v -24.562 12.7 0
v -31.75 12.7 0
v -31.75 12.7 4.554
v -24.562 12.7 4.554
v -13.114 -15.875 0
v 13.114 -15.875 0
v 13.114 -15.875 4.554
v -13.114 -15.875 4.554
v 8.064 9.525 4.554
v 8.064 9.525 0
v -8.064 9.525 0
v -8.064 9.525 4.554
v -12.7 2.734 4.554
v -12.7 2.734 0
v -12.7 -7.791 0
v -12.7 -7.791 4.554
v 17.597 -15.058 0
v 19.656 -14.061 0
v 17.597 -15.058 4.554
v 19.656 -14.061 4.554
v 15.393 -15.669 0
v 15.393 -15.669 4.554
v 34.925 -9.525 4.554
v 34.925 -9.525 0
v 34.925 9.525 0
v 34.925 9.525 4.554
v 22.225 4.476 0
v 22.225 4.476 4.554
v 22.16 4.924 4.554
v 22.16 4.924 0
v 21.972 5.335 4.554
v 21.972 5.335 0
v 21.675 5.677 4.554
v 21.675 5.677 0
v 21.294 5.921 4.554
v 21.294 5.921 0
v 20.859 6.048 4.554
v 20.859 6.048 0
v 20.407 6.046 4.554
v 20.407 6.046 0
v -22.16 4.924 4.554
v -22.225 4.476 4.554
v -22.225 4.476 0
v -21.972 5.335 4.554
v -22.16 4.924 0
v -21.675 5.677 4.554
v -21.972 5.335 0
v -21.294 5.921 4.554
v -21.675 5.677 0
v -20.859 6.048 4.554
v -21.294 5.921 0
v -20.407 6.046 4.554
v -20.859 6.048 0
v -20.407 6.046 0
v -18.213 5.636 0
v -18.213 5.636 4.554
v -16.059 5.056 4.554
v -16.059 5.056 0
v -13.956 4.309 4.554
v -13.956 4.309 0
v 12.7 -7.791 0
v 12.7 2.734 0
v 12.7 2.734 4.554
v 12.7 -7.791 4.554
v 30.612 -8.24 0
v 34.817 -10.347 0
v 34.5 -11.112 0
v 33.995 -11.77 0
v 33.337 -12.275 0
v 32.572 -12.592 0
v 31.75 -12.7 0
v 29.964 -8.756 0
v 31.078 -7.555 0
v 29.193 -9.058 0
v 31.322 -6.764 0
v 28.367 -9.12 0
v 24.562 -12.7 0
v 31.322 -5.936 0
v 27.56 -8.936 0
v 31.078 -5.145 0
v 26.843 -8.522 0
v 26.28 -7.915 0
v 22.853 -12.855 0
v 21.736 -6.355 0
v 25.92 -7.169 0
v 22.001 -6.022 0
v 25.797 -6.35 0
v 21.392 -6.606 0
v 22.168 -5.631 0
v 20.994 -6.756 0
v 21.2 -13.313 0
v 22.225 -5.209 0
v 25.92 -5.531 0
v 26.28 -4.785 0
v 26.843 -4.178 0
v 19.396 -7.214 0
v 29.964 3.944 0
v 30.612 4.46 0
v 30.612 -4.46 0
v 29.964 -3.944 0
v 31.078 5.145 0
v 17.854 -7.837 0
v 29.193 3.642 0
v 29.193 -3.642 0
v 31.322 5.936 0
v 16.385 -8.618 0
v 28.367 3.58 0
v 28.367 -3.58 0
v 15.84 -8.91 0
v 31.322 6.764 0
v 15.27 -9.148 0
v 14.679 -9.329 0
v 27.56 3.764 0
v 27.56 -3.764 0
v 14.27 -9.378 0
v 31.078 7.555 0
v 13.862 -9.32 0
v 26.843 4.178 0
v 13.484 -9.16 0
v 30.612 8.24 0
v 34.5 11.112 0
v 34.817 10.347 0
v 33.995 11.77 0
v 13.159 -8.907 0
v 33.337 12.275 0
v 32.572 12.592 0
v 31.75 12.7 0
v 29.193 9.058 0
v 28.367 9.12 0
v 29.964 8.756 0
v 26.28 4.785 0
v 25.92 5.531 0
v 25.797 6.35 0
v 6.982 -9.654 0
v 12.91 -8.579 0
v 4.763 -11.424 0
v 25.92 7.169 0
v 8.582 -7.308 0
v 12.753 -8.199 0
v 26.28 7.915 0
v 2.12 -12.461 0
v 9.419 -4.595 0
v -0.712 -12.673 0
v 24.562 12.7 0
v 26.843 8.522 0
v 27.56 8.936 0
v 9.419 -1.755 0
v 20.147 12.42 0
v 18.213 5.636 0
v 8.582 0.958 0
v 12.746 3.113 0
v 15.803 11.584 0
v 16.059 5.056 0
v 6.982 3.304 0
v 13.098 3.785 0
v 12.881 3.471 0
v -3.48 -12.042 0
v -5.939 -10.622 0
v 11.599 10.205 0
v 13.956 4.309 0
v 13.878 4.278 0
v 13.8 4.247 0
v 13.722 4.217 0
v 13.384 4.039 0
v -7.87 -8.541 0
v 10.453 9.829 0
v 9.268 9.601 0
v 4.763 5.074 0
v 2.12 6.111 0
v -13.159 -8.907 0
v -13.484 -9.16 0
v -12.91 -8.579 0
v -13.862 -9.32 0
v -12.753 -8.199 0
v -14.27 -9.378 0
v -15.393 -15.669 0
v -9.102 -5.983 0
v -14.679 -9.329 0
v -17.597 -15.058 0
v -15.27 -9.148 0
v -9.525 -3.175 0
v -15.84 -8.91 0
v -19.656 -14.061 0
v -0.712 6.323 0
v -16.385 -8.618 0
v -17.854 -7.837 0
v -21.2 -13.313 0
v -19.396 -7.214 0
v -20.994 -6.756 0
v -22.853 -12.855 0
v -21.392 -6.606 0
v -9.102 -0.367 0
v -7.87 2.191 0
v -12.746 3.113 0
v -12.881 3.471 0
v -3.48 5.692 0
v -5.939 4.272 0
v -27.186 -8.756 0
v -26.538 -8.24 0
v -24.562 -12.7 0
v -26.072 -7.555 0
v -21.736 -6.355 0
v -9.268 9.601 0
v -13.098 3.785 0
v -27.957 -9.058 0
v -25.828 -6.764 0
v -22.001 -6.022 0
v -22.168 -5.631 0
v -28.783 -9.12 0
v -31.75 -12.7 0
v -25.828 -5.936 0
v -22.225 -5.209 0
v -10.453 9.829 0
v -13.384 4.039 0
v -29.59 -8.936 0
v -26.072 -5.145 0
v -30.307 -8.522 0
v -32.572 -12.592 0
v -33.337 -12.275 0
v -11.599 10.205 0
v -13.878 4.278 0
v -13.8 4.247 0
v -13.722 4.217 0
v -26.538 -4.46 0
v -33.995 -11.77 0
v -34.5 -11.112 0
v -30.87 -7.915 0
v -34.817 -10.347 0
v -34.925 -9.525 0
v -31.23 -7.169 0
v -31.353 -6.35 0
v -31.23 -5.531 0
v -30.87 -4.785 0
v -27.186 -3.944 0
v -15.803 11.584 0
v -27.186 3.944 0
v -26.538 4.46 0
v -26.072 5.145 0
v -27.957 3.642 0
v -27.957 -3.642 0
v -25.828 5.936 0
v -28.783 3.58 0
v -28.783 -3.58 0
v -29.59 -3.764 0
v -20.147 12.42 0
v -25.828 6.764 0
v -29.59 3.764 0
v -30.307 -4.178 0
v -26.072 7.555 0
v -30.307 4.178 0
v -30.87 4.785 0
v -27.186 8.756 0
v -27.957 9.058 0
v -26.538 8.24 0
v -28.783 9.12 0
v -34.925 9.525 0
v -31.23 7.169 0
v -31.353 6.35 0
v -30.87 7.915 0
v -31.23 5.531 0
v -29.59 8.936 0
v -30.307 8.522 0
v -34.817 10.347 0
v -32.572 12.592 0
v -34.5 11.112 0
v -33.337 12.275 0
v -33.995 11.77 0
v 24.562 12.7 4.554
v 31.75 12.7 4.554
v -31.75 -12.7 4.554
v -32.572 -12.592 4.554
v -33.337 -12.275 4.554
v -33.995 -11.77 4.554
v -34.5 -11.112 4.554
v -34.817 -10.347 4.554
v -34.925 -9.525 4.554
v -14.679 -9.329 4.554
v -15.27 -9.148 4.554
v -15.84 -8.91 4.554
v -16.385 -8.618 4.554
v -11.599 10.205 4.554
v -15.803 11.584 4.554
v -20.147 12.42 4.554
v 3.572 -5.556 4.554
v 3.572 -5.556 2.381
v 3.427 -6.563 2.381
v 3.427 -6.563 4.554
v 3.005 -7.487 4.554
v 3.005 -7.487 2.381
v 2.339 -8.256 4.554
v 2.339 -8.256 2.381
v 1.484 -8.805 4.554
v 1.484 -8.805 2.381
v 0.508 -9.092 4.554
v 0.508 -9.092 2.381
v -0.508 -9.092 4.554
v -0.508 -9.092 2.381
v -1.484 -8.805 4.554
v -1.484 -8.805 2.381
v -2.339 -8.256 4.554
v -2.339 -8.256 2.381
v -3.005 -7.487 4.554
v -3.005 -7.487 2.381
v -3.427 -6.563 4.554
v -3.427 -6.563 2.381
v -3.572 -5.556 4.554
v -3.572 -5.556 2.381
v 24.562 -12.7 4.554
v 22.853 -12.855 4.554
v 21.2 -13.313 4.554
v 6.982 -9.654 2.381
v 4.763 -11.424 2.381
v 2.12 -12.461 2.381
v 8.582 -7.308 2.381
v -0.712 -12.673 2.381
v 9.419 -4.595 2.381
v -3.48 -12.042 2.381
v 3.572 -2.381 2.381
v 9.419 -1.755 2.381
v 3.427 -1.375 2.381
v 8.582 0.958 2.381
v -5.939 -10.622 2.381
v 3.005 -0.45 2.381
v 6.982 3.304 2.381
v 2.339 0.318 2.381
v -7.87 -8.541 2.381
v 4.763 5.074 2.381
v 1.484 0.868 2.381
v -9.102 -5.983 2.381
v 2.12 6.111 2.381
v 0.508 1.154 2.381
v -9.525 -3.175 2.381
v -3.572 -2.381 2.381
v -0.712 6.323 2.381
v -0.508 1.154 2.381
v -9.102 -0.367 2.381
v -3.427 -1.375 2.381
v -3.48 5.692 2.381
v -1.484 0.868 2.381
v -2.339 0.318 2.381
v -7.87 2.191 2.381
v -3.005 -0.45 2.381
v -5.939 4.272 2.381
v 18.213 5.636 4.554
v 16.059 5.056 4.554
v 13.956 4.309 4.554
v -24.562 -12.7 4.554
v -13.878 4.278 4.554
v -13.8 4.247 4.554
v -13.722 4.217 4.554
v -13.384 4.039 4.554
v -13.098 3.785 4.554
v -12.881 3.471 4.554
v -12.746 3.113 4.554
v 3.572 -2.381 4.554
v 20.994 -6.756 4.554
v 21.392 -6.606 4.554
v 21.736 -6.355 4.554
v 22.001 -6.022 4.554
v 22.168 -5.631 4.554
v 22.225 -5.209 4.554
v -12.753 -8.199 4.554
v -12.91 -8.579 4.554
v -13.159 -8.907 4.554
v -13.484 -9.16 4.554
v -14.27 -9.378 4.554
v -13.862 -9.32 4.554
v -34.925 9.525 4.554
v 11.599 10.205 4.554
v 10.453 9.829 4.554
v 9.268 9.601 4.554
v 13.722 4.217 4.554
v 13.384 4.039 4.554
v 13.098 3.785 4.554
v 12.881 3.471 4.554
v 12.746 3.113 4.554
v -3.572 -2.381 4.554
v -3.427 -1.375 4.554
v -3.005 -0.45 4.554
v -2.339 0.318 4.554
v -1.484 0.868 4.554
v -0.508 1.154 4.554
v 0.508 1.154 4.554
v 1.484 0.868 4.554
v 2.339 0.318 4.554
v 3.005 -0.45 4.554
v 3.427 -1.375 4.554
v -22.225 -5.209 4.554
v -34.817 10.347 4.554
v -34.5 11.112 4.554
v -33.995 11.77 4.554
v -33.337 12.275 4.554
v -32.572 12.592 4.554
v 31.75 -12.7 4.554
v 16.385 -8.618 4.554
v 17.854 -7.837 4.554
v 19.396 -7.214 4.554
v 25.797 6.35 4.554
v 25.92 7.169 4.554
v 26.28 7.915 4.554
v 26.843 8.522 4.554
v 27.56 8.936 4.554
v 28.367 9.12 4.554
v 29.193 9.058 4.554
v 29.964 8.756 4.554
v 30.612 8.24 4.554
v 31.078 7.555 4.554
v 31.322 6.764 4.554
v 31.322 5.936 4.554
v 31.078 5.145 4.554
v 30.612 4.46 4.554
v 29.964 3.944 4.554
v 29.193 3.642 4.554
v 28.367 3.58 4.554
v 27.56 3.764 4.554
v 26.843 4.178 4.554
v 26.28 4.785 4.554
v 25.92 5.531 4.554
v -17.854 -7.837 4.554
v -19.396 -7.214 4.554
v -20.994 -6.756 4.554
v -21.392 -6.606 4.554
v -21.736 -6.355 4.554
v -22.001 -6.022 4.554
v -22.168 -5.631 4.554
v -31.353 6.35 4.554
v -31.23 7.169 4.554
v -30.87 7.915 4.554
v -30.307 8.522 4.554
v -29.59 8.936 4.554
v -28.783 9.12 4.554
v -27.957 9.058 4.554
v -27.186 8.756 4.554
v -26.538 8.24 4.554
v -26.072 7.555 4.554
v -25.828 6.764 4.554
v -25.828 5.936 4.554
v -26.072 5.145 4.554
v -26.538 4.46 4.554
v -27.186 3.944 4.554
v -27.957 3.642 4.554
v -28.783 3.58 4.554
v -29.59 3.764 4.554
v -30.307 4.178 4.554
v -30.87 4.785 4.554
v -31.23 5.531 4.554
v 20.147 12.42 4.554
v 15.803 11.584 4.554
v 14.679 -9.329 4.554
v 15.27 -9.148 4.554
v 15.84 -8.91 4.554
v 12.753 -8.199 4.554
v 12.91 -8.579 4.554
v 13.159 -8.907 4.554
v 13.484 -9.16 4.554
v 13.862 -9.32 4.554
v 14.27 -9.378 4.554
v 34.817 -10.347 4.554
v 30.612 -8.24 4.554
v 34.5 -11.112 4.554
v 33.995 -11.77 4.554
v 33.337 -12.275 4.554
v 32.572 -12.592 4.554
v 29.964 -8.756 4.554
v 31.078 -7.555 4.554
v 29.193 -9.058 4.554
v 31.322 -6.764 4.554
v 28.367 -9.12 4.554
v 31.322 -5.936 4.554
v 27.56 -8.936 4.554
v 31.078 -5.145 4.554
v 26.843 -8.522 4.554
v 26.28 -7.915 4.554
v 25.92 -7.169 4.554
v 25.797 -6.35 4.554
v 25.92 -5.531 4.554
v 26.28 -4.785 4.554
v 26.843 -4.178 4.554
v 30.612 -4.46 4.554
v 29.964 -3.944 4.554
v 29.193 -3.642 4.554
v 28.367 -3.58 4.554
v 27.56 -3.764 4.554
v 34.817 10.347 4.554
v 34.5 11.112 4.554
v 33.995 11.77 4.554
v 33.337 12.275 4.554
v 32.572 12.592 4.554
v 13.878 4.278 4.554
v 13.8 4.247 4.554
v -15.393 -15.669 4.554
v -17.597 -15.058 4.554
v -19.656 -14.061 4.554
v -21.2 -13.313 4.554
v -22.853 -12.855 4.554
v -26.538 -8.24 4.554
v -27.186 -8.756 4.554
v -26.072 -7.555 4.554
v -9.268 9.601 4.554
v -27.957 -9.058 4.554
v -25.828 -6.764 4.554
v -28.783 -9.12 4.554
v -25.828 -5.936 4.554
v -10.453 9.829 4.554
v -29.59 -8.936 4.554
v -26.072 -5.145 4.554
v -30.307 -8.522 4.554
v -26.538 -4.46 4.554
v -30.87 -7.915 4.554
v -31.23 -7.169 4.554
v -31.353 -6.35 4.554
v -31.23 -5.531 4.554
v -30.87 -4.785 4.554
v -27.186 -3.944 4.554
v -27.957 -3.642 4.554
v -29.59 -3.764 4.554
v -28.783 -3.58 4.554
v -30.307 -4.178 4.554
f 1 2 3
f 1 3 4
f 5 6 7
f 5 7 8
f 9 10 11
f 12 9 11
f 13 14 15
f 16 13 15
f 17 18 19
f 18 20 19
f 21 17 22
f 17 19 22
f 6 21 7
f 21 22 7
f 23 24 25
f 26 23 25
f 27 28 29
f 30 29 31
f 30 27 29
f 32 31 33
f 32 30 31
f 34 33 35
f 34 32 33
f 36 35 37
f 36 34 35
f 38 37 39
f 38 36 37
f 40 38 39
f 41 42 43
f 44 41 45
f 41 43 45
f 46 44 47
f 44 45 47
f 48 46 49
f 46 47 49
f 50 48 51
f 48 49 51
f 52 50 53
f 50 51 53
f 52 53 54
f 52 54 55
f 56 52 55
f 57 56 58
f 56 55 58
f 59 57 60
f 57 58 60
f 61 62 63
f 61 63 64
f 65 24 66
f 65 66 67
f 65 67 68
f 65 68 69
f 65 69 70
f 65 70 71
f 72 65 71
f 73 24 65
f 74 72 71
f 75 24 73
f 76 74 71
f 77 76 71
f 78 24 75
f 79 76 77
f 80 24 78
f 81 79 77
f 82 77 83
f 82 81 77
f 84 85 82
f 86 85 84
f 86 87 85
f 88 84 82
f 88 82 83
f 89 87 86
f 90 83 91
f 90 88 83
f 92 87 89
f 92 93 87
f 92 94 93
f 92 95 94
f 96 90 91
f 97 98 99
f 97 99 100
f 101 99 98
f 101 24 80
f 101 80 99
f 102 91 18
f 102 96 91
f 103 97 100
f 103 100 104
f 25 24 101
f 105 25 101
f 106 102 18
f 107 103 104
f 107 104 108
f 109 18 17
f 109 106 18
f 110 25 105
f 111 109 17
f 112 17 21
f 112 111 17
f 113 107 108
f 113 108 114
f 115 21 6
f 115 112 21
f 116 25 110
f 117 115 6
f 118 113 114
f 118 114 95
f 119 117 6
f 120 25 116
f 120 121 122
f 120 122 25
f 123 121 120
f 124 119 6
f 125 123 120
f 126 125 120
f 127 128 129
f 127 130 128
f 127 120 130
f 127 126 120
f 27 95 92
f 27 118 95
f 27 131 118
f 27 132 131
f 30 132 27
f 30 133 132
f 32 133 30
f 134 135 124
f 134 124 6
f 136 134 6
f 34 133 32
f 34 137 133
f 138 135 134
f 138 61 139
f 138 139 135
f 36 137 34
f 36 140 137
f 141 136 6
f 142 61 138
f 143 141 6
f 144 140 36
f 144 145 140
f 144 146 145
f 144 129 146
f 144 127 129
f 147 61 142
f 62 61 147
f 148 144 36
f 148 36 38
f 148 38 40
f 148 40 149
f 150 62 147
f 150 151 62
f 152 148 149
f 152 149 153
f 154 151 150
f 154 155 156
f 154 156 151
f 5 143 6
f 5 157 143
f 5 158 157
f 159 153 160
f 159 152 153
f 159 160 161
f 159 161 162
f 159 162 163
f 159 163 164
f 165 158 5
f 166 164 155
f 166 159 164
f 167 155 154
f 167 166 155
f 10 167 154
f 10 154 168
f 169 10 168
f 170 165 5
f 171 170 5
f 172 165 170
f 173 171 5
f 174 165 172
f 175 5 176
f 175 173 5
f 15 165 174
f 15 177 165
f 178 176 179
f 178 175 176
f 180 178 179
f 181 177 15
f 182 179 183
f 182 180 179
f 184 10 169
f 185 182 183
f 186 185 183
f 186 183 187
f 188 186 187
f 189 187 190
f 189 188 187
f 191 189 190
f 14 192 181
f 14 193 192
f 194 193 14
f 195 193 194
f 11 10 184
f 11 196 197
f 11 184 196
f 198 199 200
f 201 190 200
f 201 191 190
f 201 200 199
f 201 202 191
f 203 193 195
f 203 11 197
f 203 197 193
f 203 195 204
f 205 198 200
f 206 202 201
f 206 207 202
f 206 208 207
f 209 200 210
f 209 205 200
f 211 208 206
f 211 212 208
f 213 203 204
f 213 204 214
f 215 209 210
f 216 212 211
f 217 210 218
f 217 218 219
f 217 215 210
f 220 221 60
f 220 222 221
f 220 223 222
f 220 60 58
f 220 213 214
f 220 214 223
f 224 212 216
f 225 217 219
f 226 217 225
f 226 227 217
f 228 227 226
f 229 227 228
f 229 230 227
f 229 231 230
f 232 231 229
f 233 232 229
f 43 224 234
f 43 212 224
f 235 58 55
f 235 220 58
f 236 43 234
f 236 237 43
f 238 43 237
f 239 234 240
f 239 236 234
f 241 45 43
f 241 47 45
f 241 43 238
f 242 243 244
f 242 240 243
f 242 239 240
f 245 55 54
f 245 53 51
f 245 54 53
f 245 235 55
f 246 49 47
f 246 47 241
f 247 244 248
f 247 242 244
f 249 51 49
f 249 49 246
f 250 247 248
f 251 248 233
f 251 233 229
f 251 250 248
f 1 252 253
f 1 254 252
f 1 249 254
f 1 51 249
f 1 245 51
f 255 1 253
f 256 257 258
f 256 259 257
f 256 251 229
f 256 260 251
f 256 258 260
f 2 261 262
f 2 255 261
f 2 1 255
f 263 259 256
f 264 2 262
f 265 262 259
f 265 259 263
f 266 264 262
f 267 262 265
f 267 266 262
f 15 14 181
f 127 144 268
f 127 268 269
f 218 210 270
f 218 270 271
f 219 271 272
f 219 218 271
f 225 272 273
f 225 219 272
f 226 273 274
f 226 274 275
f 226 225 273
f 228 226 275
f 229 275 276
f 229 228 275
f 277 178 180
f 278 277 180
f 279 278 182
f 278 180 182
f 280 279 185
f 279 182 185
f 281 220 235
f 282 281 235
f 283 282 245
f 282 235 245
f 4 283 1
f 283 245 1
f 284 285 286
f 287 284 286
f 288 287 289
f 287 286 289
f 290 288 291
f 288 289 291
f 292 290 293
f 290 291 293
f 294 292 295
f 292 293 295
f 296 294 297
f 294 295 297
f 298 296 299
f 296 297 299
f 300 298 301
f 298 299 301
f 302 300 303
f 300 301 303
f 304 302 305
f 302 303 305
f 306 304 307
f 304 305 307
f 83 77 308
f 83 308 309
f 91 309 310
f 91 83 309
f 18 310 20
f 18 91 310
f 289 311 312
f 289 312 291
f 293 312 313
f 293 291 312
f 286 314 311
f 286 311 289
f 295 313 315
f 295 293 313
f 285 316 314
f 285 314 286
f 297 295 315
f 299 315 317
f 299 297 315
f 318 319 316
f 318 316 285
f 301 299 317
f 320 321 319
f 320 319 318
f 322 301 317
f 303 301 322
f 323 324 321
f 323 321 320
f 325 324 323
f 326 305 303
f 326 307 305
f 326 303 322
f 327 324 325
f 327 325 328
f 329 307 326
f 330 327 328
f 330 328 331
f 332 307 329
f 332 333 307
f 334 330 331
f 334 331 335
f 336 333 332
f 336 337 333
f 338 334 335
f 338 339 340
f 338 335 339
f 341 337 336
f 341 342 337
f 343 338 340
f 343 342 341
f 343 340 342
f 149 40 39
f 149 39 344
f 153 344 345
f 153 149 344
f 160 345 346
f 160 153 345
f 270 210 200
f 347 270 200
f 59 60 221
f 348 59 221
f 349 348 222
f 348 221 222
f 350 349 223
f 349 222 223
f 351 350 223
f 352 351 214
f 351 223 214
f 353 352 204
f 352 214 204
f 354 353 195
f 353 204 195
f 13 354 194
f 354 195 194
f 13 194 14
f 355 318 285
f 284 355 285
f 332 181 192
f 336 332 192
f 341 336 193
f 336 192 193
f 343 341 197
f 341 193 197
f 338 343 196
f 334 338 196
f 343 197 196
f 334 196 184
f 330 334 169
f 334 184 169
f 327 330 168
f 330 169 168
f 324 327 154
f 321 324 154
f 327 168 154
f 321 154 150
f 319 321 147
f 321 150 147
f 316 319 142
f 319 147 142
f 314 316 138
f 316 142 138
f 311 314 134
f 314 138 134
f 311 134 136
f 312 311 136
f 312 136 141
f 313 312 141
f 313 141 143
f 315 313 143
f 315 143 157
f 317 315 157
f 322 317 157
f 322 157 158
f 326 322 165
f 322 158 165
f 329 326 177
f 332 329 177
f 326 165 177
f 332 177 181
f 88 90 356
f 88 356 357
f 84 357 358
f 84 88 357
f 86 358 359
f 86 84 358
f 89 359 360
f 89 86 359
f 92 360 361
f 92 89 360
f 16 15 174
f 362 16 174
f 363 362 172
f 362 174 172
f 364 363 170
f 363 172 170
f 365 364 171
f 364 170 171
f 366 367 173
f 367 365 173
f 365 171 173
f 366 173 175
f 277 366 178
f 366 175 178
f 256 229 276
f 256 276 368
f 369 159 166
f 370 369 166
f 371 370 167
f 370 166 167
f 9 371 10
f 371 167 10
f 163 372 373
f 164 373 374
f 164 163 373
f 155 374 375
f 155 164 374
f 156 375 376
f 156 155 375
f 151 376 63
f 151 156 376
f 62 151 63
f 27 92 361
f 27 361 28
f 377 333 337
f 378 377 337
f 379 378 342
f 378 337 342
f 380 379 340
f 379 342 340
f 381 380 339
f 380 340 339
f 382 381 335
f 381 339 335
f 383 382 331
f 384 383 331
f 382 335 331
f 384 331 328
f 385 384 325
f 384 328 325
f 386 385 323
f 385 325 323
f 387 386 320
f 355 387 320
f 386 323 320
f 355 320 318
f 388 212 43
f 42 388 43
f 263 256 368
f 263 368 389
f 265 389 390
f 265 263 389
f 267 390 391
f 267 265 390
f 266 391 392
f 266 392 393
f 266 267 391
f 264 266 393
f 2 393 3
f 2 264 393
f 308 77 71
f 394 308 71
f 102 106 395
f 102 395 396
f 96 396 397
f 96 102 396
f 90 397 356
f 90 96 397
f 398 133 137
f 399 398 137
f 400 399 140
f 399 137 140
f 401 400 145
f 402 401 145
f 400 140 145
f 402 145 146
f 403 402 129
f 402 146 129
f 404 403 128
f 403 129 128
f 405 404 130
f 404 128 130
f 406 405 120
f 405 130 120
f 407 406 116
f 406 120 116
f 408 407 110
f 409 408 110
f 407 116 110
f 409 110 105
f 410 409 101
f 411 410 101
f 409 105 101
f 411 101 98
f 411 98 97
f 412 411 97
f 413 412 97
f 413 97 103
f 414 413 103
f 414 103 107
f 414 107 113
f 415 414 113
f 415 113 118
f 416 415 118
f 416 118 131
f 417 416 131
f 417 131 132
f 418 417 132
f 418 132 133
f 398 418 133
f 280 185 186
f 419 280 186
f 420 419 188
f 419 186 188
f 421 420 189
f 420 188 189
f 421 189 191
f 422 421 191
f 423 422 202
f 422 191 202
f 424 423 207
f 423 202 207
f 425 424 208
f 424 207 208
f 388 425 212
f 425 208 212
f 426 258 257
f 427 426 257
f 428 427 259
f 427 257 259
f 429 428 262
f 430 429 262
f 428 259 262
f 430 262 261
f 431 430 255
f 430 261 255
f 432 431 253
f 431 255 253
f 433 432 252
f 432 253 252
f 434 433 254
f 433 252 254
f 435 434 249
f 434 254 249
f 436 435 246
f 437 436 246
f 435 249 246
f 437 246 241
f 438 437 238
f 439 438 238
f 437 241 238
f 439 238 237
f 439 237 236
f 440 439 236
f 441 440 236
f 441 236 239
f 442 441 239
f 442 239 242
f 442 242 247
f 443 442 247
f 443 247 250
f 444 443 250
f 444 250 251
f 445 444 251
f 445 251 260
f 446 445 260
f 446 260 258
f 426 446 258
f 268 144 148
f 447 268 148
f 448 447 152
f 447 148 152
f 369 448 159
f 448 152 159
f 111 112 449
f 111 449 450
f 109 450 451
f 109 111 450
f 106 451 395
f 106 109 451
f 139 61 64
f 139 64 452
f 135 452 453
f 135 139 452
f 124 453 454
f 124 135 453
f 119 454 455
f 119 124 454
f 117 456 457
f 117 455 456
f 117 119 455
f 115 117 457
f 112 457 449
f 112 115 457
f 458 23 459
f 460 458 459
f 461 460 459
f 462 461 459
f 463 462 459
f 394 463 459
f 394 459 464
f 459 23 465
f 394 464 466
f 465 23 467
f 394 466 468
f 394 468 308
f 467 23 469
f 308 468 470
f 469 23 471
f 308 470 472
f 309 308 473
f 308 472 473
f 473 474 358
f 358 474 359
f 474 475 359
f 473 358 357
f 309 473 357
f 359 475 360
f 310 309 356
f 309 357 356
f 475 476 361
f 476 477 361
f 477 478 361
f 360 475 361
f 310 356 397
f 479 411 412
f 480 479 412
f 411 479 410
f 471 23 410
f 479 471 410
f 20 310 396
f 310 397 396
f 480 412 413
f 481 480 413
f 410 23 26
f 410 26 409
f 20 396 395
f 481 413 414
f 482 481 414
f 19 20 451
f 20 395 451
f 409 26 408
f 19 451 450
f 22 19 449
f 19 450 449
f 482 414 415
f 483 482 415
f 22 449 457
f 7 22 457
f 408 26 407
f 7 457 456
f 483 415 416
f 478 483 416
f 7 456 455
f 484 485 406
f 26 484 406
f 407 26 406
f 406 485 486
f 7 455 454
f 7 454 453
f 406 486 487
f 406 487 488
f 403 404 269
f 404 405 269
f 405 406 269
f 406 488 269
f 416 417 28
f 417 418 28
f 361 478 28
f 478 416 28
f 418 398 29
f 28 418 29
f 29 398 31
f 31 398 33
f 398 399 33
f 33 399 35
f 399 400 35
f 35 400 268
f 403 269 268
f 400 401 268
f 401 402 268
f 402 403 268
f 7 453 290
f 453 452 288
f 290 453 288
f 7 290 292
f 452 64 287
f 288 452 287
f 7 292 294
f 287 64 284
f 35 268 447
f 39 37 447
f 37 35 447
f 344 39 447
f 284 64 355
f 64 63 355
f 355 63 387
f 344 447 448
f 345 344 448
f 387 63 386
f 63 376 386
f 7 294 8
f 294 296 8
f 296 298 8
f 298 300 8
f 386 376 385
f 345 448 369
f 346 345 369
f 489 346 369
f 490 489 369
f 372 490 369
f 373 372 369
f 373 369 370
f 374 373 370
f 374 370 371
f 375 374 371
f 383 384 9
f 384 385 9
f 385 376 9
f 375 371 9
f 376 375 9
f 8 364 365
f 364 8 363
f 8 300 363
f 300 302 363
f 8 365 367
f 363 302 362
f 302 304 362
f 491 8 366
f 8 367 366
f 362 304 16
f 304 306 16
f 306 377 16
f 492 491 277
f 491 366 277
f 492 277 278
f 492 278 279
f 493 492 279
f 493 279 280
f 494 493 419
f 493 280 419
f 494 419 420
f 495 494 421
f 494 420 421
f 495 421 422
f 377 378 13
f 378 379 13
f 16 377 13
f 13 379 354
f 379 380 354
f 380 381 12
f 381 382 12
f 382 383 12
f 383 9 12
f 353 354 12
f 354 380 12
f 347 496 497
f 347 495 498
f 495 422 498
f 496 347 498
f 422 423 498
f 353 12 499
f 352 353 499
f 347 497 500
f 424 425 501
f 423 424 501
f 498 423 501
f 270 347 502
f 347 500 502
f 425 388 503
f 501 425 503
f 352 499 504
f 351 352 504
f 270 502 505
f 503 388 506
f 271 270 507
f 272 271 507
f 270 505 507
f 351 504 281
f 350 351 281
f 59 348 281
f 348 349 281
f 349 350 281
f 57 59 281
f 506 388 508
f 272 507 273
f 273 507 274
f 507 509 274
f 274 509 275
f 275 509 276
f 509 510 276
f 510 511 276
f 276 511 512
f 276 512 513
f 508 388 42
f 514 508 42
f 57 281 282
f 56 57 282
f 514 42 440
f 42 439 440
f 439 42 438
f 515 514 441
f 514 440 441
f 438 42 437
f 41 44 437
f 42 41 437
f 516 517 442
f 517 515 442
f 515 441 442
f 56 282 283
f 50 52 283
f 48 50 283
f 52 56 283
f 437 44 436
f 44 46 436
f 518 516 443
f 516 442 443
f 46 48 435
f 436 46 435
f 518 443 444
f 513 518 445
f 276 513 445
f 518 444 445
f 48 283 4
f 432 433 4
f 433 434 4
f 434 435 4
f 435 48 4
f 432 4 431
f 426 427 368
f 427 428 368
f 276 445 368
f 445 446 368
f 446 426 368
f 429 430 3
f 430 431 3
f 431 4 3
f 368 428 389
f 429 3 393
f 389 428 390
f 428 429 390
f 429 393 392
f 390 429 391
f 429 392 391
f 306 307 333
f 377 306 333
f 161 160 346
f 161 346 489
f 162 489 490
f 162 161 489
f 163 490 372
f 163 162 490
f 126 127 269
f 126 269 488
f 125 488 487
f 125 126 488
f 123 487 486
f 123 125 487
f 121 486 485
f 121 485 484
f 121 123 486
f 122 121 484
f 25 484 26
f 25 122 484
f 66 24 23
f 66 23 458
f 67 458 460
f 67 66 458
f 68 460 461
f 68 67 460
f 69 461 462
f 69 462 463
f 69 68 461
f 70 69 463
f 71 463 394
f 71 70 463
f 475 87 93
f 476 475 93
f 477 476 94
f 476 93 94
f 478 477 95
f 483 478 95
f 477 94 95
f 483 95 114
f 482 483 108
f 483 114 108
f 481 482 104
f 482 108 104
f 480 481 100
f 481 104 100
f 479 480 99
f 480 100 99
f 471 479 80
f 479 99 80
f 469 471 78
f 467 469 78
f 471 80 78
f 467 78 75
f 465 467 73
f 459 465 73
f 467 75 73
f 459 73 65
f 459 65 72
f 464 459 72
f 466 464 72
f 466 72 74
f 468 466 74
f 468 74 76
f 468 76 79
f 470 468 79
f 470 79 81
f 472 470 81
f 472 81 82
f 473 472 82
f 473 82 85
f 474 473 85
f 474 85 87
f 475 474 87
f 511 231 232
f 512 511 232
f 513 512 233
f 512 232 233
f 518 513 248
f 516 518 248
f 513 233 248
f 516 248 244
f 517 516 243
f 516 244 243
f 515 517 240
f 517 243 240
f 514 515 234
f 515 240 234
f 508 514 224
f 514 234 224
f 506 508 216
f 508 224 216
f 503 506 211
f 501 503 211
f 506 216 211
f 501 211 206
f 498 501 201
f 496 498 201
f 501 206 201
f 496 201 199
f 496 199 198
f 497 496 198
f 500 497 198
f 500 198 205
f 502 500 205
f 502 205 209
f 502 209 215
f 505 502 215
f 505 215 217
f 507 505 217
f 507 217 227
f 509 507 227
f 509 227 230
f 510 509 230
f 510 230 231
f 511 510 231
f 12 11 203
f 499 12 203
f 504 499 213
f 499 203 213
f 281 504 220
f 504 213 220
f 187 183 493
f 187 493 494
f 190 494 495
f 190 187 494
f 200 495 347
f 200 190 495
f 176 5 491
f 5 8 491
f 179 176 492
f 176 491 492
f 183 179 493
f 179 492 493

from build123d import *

# Parameters (mm, degrees)
SKETCH1_W                       = 69.85
SKETCH1_H                       = 25.4
BASE_FLANGE1_DEPTH              = 4.55422
F_7_32_0_21875_DIAMETER_HOLE1_D = 5.55625
BREAK_CORNER1_DEPTH             = 4.55422
SKETCH4_W                       = 34.925
SKETCH4_H                       = 3.175
TAB1_DEPTH                      = 4.55422
FILLET1_R                       = 9.525
CUT_EXTRUDE1_REACH              = 40.633
SKETCH7_R                       = 9.525
CUT_EXTRUDE3_DEPTH              = 2.38125
F_9_32_0_28125_DIAMETER_HOLE1_D = 7.14375
FILLET3_R                       = 12.7
CUT_EXTRUDE4_START              = -2.17297
CUT_EXTRUDE4_DEPTH              = 2.17297
CUT_EXTRUDE5_REACH              = 40.633


# Read off the part's stored shape, not the designer's step: Break-Corner1
# Sheet-metal steps are written as plain solids
with BuildPart() as part:
    # Sketch1 → Base-Flange1 (new body)
    with BuildSketch(Plane.XY):
        Rectangle(SKETCH1_W, SKETCH1_H)
    extrude(amount=BASE_FLANGE1_DEPTH)

    # 7/32 (0.21875) Diameter Hole1 (through all)
    with Locations(Plane.XY.offset(4.55422)):
        with Locations((-28.575, 6.35), (-28.575, -6.35), (28.575, 6.35), (28.575, -6.35)):
            Hole(F_7_32_0_21875_DIAMETER_HOLE1_D / 2)

    # Break-Corner1 outline → Break-Corner1 (cut)
    with BuildSketch(Plane.XY):
        with BuildLine():
            Line((34.925, -12.7), (34.925, -9.525))
            ThreePointArc((34.925, -9.525), (33.99506403, -11.77006403), (31.75, -12.7))
            Line((31.75, -12.7), (34.925, -12.7))
        make_face()
        with BuildLine():
            ThreePointArc((31.75, 12.7), (33.99506403, 11.77006403), (34.925, 9.525))
            Line((34.925, 9.525), (34.925, 12.7))
            Line((34.925, 12.7), (31.75, 12.7))
        make_face()
        with BuildLine():
            Line((-34.925, -12.7), (-31.75, -12.7))
            ThreePointArc((-31.75, -12.7), (-33.99506403, -11.77006403), (-34.925, -9.525))
            Line((-34.925, -9.525), (-34.925, -12.7))
        make_face()
        with BuildLine():
            ThreePointArc((-34.925, 9.525), (-33.99506403, 11.77006403), (-31.75, 12.7))
            Line((-31.75, 12.7), (-34.925, 12.7))
            Line((-34.925, 12.7), (-34.925, 9.525))
        make_face()
    extrude(amount=BREAK_CORNER1_DEPTH, mode=Mode.SUBTRACT)

    # Sketch4 → Tab1 (add)
    with BuildSketch(Plane(origin=(0, 0, 0), x_dir=(-1, 0, 0), z_dir=(0, 0, -1))):
        with Locations((0, -14.2875)):
            Rectangle(SKETCH4_W, SKETCH4_H)
    extrude(amount=-TAB1_DEPTH)

    # Fillet1
    # the kernel refuses this fillet: 9.525 mm, written as the material it adds along each edge
    with BuildSketch(Plane(origin=(-17.4625, -12.7, 0), x_dir=(-1, 0, 0), z_dir=(0, 0, 1))) as fillet1_piece_1:
        with BuildLine():
            CenterArc((7.099515829, 9.525), FILLET1_R, 221.810314896, 48.189685104)
            Line((0, 3.175), (-0.141990317, 3.048))
            ThreePointArc((-0.141990317, 3.048), (-0.1905, 1.5875), (-0.1905, 0))
            Line((-0.1905, 0), (0, -0.1905))
            Line((0, -0.1905), (7.099515829, -0.1905))
            Line((7.099515829, -0.1905), (7.099515829, 0))
        make_face()
    extrude(amount=4.55422)
    with BuildSketch(Plane(origin=(17.4625, -12.7, 0), x_dir=(1, 0, 0), z_dir=(0, 0, 1))) as fillet1_piece_2:
        with BuildLine():
            CenterArc((7.099515829, -9.525), FILLET1_R, 90, 48.189685104)
            Line((0, -3.175), (-0.141990317, -3.048))
            ThreePointArc((-0.141990317, -3.048), (-0.1905, -1.5875), (-0.1905, 0))
            Line((-0.1905, 0), (0, 0.1905))
            Line((0, 0.1905), (7.099515829, 0.1905))
            Line((7.099515829, 0.1905), (7.099515829, 0))
        make_face()
    extrude(amount=4.55422)

    # Sketch5 → Cut-Extrude1 (cut, up to next)
    with BuildSketch(Plane(origin=(0, 0, 0), x_dir=(-1, 0, 0), z_dir=(0, 0, -1)), mode=Mode.PRIVATE) as cut_extrude1_sk1:
        with BuildLine():
            Line((-8.064231886, 9.525), (8.064231886, 9.525))
            ThreePointArc((8.064231886, 9.525), (9.864287689, 9.69663568), (11.599471303, 10.205357143))
            ThreePointArc((11.599471303, 10.205357143), (17.961811219, 12.070669174), (24.562015829, 12.7))
            Line((24.562015829, 12.7), (-24.562015829, 12.7))
            ThreePointArc((-24.562015829, 12.7), (-17.961811219, 12.070669174), (-11.599471303, 10.205357143))
            ThreePointArc((-11.599471303, 10.205357143), (-9.864287689, 9.69663568), (-8.064231886, 9.525))
        make_face()
    cut_extrude1_tool1 = extrude(cut_extrude1_sk1.sketch, amount=-CUT_EXTRUDE1_REACH, mode=Mode.PRIVATE) & part.part
    add(cut_extrude1_tool1.solids().sort_by_distance((0, 11.328032, 0))[0], mode=Mode.SUBTRACT)

    # Sketch7 → Cut-Extrude3 (cut)
    with BuildSketch(Plane(origin=(0, 0, 0), x_dir=(-1, 0, 0), z_dir=(0, 0, -1))):
        with Locations((0, -3.175)):
            Circle(SKETCH7_R)
    extrude(amount=-CUT_EXTRUDE3_DEPTH, mode=Mode.SUBTRACT)

    # 9/32 (0.28125) Diameter Hole1 (through all)
    with Locations(Plane(origin=(0, 0, 2.38125), x_dir=(-1, 0, 0), z_dir=(0, 0, -1))):
        with Locations((0, -3.175)):
            Hole(F_9_32_0_28125_DIAMETER_HOLE1_D / 2)

    # Fillet3
    fillet3_edges = [part.edges().sort_by_distance(p)[0] for p in [
        (17.4625, -15.875, 2.27711),
        (-17.4625, -15.875, 2.27711),
    ]]
    fillet(fillet3_edges, radius=FILLET3_R)

    # Sketch10 → Cut-Extrude4 (cut)
    with BuildSketch(Plane.XY.offset(4.55422).offset(CUT_EXTRUDE4_START)):
        with BuildLine():
            Line((3.571875, -2.38125), (3.571875, -5.55625))
            ThreePointArc((3.571875, -5.55625), (0, -9.128125), (-3.571875, -5.55625))
            Line((-3.571875, -5.55625), (-3.571875, -2.38125))
            ThreePointArc((-3.571875, -2.38125), (0, 1.190625), (3.571875, -2.38125))
        make_face()
    extrude(amount=CUT_EXTRUDE4_DEPTH, mode=Mode.SUBTRACT)

    # Sketch11 → Cut-Extrude5 (cut, up to next)
    with BuildSketch(Plane(origin=(0, 0, 0), x_dir=(-1, 0, 0), z_dir=(0, 0, -1)), mode=Mode.PRIVATE) as cut_extrude5_sk1:
        with BuildLine():
            Line((-22.225, -5.20921081), (-22.225, 4.475624183))
            ThreePointArc((-22.225, 4.475624183), (-21.675207986, 5.677006048), (-20.406646128, 6.046249135))
            ThreePointArc((-20.406646128, 6.046249135), (-17.13052876, 5.366731097), (-13.95629758, 4.308928571))
            ThreePointArc((-13.95629758, 4.308928571), (-13.839204583, 4.262663683), (-13.721748353, 4.217328884))
            ThreePointArc((-13.721748353, 4.217328884), (-12.980157851, 3.634624239), (-12.7, 2.734061773))
            Line((-12.7, 2.734061773), (-12.7, -7.790757838))
            ThreePointArc((-12.7, -7.790757838), (-13.312978112, -9.043939125), (-14.67853649, -9.329343784))
            ThreePointArc((-14.67853649, -9.329343784), (-15.557873342, -9.03604869), (-16.385140615, -8.617857143))
            ThreePointArc((-16.385140615, -8.617857143), (-18.616383766, -7.505452304), (-20.994274166, -6.756100736))
            ThreePointArc((-20.994274166, -6.756100736), (-21.879783228, -6.197587575), (-22.225, -5.20921081))
        make_face()
    cut_extrude5_tool1 = extrude(cut_extrude5_sk1.sketch, amount=-CUT_EXTRUDE5_REACH, mode=Mode.PRIVATE) & part.part
    cut_extrude5 = cut_extrude5_tool1.solids().sort_by_distance((17.387748, -1.405717, 0))[0]
    add(cut_extrude5, mode=Mode.SUBTRACT)

    # Mirror1: Cut-Extrude5 across plane
    add(cut_extrude5.mirror(Plane(origin=(0, 0, 0), x_dir=(0, 0, 1), z_dir=(1, 0, 0))), mode=Mode.SUBTRACT)


solid = part.part
